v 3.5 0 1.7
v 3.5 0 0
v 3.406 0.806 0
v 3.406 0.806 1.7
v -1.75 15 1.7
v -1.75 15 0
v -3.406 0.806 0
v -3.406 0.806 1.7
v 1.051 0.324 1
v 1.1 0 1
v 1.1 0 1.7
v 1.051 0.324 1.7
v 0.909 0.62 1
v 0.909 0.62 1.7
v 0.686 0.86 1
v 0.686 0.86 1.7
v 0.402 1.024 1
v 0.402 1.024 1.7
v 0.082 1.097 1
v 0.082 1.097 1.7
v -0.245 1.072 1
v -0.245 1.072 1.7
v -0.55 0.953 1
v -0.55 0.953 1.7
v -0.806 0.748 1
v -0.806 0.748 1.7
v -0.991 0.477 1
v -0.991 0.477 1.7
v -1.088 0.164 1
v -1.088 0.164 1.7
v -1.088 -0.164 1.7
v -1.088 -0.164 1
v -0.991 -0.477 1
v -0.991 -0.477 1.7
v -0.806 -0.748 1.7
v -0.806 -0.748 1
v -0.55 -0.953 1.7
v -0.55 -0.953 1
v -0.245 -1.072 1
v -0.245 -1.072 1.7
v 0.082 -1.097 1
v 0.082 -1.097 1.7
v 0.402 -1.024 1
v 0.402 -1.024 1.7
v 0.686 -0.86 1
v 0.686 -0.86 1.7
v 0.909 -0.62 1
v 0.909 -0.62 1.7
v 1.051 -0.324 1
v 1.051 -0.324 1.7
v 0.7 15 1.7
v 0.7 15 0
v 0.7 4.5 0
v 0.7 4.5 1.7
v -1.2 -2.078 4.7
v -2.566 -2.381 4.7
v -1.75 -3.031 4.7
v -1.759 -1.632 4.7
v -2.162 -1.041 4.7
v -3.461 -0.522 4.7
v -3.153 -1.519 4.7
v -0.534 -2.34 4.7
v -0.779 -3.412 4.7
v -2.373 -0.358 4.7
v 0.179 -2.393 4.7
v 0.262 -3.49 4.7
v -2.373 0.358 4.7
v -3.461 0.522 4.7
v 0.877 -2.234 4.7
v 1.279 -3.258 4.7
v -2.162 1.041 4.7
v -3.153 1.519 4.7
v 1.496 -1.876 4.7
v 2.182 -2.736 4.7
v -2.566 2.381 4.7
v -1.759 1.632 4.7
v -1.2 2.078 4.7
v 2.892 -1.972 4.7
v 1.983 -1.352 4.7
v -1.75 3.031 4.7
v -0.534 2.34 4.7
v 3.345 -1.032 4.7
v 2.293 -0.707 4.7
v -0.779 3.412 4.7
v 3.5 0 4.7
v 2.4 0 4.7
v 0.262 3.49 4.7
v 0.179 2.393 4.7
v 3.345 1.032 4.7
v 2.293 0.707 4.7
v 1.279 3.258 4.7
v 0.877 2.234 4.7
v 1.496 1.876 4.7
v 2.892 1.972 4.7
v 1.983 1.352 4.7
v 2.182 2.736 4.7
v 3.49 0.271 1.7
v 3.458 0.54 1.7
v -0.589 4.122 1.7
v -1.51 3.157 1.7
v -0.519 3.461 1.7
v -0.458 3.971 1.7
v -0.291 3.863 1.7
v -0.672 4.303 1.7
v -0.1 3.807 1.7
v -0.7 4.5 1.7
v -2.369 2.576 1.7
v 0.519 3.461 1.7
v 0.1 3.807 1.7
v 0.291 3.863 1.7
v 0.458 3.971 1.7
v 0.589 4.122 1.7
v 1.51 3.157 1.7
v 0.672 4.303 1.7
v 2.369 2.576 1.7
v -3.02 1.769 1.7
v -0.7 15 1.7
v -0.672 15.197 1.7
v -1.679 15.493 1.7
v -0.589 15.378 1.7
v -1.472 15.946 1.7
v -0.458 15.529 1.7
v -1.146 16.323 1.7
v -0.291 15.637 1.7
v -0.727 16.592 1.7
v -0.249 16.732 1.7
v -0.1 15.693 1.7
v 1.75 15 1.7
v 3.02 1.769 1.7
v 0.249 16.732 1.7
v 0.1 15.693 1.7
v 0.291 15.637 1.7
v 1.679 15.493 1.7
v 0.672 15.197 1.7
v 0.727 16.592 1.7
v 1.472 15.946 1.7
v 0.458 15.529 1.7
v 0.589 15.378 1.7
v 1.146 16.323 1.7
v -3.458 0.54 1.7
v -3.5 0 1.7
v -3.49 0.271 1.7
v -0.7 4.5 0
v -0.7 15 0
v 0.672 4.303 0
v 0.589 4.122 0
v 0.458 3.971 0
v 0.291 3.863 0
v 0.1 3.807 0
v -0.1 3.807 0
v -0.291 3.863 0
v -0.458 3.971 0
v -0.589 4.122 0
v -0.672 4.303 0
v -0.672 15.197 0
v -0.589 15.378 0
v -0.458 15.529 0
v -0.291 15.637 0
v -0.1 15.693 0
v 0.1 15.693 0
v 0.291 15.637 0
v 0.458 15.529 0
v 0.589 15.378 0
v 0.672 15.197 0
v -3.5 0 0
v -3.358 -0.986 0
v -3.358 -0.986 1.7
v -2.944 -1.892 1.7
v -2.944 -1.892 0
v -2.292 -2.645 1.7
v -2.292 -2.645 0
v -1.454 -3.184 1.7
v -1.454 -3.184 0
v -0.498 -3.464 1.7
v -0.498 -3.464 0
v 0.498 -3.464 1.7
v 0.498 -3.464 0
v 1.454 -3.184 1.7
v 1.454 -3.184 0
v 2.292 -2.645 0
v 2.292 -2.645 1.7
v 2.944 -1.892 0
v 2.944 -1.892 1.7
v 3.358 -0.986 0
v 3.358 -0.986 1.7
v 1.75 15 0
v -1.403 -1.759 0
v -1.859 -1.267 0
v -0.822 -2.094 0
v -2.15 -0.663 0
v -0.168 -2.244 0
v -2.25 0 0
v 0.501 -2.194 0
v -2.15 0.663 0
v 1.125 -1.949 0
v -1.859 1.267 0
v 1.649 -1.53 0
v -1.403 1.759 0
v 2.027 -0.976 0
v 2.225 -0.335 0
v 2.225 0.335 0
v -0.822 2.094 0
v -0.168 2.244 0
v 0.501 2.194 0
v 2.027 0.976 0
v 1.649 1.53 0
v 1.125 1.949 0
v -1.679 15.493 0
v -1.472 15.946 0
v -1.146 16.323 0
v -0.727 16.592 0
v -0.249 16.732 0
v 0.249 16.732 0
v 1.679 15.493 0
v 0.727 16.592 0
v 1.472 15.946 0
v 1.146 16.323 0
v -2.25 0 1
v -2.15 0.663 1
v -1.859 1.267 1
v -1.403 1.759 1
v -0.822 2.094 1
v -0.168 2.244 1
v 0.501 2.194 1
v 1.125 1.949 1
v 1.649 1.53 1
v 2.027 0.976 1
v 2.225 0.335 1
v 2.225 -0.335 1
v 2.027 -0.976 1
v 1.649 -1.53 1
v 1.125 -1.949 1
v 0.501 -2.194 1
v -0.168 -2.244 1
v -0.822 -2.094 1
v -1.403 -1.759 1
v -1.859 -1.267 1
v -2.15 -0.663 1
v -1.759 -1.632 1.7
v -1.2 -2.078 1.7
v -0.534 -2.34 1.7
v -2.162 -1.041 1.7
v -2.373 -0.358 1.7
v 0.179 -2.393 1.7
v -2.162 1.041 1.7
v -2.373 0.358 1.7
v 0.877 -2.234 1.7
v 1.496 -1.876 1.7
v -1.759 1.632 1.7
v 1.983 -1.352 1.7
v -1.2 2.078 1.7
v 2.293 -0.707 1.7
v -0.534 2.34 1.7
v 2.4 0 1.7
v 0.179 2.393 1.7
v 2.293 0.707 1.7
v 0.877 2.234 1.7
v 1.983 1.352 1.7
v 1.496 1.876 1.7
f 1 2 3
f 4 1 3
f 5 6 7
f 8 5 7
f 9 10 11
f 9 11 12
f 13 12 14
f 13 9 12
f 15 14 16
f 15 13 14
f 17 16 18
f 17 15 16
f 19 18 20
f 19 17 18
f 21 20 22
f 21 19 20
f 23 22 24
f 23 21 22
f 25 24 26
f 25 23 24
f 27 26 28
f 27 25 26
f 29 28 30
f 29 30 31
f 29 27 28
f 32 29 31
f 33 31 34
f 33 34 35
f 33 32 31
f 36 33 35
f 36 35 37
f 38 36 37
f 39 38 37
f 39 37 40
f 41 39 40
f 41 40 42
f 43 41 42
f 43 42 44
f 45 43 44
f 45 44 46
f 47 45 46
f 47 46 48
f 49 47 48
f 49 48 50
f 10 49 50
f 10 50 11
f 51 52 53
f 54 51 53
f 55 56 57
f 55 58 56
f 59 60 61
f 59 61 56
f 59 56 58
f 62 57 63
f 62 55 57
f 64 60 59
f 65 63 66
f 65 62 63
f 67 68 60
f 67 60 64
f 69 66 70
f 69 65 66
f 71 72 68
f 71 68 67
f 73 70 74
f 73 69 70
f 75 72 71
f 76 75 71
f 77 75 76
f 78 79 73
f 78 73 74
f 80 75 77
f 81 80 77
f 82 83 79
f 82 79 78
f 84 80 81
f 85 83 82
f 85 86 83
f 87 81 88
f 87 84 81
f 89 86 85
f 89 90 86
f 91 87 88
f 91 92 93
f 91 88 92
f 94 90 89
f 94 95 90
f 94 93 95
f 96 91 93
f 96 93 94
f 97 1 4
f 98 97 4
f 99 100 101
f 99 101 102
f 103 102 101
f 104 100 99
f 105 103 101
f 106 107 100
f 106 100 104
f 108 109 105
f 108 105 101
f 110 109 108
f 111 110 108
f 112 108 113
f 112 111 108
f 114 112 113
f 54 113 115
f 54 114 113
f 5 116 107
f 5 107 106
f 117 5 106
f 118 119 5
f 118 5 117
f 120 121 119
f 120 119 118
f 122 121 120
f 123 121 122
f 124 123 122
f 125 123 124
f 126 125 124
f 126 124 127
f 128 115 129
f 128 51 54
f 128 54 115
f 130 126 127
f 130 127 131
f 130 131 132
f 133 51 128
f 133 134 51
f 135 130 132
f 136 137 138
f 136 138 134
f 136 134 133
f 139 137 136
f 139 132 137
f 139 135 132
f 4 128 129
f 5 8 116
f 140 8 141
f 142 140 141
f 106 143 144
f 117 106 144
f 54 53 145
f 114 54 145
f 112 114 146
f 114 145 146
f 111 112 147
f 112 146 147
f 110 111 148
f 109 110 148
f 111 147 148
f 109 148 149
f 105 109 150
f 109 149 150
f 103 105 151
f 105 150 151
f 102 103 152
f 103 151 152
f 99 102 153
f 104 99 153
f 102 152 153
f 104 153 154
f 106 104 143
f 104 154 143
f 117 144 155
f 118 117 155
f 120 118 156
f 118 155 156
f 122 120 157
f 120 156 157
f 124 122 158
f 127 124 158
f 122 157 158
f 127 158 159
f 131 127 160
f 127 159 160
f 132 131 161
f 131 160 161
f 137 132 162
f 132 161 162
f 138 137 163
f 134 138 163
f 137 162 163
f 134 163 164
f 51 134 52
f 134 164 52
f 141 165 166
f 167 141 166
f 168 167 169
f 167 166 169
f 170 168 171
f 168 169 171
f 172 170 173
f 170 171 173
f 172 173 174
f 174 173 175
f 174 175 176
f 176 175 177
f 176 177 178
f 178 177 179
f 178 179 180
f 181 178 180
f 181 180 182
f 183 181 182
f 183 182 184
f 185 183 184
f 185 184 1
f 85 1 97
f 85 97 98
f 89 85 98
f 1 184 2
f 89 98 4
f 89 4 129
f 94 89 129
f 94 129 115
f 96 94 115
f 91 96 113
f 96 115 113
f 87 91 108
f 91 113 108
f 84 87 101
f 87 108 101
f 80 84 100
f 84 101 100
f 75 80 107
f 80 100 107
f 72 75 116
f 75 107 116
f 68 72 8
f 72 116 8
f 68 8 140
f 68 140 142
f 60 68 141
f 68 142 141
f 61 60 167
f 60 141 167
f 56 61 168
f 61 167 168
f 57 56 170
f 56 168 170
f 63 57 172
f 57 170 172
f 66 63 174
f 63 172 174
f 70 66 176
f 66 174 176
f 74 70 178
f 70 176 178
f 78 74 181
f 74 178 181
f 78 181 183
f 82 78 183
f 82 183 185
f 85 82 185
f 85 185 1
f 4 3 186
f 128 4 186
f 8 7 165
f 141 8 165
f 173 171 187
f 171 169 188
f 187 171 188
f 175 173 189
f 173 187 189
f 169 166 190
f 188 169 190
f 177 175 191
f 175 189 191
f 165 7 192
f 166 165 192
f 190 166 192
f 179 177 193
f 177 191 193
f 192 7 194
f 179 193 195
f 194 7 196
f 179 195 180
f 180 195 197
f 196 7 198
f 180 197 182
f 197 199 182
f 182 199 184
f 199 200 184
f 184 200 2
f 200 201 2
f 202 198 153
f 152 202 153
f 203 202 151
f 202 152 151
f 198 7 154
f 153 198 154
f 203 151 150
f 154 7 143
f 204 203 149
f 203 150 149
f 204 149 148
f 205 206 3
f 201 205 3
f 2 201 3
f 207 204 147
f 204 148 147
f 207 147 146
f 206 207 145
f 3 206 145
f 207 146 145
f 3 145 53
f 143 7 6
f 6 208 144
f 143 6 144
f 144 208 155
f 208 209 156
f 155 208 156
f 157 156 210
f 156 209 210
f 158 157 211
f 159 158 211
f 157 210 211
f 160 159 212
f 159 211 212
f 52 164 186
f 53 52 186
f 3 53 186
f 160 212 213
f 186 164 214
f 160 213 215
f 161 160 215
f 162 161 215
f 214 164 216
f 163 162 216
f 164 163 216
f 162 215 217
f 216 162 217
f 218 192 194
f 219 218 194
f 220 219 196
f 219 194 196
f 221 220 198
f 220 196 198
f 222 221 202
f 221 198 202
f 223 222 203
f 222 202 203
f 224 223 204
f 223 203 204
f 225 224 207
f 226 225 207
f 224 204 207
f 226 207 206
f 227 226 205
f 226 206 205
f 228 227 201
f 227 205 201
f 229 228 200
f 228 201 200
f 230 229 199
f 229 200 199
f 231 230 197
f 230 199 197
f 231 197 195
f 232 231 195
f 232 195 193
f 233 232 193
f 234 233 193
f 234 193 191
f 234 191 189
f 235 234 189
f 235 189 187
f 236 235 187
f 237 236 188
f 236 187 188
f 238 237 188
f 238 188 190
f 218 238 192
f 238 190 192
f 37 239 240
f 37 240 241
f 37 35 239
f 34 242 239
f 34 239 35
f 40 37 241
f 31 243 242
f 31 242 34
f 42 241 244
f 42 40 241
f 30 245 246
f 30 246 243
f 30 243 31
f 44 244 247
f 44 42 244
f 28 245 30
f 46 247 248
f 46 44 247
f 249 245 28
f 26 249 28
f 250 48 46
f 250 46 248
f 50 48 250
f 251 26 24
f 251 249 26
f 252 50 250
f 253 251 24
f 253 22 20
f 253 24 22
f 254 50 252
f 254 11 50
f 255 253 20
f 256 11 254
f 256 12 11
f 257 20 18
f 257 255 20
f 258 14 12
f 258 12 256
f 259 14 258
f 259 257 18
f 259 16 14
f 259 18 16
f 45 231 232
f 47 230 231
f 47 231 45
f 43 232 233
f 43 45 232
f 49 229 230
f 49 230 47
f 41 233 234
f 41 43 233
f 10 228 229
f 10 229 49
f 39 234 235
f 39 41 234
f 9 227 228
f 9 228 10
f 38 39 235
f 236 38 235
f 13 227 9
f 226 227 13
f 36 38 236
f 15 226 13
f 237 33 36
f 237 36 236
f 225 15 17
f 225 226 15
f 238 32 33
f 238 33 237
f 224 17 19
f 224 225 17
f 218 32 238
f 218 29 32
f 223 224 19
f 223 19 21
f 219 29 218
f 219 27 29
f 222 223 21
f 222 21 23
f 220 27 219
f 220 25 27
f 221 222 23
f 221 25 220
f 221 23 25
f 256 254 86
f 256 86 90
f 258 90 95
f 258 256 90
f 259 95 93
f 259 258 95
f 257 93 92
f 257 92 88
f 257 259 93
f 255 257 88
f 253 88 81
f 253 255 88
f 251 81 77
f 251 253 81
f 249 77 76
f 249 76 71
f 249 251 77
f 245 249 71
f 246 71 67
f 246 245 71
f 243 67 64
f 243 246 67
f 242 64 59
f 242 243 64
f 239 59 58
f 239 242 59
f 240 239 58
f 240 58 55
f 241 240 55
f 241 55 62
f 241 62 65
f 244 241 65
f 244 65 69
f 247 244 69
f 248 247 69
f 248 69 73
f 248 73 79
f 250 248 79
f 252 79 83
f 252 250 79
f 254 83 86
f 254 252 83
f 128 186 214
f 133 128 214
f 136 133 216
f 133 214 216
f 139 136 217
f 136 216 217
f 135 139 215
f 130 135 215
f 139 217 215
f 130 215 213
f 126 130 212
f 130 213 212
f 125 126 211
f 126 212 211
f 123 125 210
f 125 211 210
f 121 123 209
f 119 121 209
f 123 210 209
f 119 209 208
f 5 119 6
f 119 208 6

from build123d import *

# Parameters (mm, degrees)
CROQUIS1_R              = 1.1
SALIENTE_EXTRUIR1_DEPTH = 1.7
CROQUIS2_R              = 3.5
CROQUIS2_R_2            = 2.4
SALIENTE_EXTRUIR2_DEPTH = 3
CROQUIS3_R              = 2.25
CORTAR_EXTRUIR1_DEPTH   = 1


with BuildPart() as part:
    # Croquis1 → Saliente-Extruir1 (new body)
    with BuildSketch(Plane.XY):
        with BuildLine():
            ThreePointArc((1.75, 15), (0, 16.75), (-1.75, 15))
            Line((-1.75, 15), (-3.406001644, 0.805700192))
            Line((-3.406001644, 0.805700192), (-3.5, 0))
            ThreePointArc((-3.5, 0), (0, -3.5), (3.5, 0))
            Line((3.5, 0), (3.406001644, 0.805700192))
            Line((3.406001644, 0.805700192), (1.75, 15))
        make_face()
        Circle(CROQUIS1_R, mode=Mode.SUBTRACT)
        with BuildLine():
            ThreePointArc((-0.7, 15), (0, 15.7), (0.7, 15))
            Line((0.7, 15), (0.7, 4.5))
            ThreePointArc((0.7, 4.5), (0, 3.8), (-0.7, 4.5))
            Line((-0.7, 4.5), (-0.7, 15))
        make_face(mode=Mode.SUBTRACT)
    extrude(amount=SALIENTE_EXTRUIR1_DEPTH)

    # Croquis2 → Saliente-Extruir2 (add)
    with BuildSketch(Plane.XY.offset(1.7)):
        Circle(CROQUIS2_R)
        Circle(CROQUIS2_R_2, mode=Mode.SUBTRACT)
    extrude(amount=SALIENTE_EXTRUIR2_DEPTH)

    # Croquis3 → Cortar-Extruir1 (cut)
    with BuildSketch(Plane(origin=(0, 0, 0), x_dir=(-1, 0, 0), z_dir=(0, 0, -1))):
        Circle(CROQUIS3_R)
    extrude(amount=-CORTAR_EXTRUIR1_DEPTH, mode=Mode.SUBTRACT)


solid = part.part
